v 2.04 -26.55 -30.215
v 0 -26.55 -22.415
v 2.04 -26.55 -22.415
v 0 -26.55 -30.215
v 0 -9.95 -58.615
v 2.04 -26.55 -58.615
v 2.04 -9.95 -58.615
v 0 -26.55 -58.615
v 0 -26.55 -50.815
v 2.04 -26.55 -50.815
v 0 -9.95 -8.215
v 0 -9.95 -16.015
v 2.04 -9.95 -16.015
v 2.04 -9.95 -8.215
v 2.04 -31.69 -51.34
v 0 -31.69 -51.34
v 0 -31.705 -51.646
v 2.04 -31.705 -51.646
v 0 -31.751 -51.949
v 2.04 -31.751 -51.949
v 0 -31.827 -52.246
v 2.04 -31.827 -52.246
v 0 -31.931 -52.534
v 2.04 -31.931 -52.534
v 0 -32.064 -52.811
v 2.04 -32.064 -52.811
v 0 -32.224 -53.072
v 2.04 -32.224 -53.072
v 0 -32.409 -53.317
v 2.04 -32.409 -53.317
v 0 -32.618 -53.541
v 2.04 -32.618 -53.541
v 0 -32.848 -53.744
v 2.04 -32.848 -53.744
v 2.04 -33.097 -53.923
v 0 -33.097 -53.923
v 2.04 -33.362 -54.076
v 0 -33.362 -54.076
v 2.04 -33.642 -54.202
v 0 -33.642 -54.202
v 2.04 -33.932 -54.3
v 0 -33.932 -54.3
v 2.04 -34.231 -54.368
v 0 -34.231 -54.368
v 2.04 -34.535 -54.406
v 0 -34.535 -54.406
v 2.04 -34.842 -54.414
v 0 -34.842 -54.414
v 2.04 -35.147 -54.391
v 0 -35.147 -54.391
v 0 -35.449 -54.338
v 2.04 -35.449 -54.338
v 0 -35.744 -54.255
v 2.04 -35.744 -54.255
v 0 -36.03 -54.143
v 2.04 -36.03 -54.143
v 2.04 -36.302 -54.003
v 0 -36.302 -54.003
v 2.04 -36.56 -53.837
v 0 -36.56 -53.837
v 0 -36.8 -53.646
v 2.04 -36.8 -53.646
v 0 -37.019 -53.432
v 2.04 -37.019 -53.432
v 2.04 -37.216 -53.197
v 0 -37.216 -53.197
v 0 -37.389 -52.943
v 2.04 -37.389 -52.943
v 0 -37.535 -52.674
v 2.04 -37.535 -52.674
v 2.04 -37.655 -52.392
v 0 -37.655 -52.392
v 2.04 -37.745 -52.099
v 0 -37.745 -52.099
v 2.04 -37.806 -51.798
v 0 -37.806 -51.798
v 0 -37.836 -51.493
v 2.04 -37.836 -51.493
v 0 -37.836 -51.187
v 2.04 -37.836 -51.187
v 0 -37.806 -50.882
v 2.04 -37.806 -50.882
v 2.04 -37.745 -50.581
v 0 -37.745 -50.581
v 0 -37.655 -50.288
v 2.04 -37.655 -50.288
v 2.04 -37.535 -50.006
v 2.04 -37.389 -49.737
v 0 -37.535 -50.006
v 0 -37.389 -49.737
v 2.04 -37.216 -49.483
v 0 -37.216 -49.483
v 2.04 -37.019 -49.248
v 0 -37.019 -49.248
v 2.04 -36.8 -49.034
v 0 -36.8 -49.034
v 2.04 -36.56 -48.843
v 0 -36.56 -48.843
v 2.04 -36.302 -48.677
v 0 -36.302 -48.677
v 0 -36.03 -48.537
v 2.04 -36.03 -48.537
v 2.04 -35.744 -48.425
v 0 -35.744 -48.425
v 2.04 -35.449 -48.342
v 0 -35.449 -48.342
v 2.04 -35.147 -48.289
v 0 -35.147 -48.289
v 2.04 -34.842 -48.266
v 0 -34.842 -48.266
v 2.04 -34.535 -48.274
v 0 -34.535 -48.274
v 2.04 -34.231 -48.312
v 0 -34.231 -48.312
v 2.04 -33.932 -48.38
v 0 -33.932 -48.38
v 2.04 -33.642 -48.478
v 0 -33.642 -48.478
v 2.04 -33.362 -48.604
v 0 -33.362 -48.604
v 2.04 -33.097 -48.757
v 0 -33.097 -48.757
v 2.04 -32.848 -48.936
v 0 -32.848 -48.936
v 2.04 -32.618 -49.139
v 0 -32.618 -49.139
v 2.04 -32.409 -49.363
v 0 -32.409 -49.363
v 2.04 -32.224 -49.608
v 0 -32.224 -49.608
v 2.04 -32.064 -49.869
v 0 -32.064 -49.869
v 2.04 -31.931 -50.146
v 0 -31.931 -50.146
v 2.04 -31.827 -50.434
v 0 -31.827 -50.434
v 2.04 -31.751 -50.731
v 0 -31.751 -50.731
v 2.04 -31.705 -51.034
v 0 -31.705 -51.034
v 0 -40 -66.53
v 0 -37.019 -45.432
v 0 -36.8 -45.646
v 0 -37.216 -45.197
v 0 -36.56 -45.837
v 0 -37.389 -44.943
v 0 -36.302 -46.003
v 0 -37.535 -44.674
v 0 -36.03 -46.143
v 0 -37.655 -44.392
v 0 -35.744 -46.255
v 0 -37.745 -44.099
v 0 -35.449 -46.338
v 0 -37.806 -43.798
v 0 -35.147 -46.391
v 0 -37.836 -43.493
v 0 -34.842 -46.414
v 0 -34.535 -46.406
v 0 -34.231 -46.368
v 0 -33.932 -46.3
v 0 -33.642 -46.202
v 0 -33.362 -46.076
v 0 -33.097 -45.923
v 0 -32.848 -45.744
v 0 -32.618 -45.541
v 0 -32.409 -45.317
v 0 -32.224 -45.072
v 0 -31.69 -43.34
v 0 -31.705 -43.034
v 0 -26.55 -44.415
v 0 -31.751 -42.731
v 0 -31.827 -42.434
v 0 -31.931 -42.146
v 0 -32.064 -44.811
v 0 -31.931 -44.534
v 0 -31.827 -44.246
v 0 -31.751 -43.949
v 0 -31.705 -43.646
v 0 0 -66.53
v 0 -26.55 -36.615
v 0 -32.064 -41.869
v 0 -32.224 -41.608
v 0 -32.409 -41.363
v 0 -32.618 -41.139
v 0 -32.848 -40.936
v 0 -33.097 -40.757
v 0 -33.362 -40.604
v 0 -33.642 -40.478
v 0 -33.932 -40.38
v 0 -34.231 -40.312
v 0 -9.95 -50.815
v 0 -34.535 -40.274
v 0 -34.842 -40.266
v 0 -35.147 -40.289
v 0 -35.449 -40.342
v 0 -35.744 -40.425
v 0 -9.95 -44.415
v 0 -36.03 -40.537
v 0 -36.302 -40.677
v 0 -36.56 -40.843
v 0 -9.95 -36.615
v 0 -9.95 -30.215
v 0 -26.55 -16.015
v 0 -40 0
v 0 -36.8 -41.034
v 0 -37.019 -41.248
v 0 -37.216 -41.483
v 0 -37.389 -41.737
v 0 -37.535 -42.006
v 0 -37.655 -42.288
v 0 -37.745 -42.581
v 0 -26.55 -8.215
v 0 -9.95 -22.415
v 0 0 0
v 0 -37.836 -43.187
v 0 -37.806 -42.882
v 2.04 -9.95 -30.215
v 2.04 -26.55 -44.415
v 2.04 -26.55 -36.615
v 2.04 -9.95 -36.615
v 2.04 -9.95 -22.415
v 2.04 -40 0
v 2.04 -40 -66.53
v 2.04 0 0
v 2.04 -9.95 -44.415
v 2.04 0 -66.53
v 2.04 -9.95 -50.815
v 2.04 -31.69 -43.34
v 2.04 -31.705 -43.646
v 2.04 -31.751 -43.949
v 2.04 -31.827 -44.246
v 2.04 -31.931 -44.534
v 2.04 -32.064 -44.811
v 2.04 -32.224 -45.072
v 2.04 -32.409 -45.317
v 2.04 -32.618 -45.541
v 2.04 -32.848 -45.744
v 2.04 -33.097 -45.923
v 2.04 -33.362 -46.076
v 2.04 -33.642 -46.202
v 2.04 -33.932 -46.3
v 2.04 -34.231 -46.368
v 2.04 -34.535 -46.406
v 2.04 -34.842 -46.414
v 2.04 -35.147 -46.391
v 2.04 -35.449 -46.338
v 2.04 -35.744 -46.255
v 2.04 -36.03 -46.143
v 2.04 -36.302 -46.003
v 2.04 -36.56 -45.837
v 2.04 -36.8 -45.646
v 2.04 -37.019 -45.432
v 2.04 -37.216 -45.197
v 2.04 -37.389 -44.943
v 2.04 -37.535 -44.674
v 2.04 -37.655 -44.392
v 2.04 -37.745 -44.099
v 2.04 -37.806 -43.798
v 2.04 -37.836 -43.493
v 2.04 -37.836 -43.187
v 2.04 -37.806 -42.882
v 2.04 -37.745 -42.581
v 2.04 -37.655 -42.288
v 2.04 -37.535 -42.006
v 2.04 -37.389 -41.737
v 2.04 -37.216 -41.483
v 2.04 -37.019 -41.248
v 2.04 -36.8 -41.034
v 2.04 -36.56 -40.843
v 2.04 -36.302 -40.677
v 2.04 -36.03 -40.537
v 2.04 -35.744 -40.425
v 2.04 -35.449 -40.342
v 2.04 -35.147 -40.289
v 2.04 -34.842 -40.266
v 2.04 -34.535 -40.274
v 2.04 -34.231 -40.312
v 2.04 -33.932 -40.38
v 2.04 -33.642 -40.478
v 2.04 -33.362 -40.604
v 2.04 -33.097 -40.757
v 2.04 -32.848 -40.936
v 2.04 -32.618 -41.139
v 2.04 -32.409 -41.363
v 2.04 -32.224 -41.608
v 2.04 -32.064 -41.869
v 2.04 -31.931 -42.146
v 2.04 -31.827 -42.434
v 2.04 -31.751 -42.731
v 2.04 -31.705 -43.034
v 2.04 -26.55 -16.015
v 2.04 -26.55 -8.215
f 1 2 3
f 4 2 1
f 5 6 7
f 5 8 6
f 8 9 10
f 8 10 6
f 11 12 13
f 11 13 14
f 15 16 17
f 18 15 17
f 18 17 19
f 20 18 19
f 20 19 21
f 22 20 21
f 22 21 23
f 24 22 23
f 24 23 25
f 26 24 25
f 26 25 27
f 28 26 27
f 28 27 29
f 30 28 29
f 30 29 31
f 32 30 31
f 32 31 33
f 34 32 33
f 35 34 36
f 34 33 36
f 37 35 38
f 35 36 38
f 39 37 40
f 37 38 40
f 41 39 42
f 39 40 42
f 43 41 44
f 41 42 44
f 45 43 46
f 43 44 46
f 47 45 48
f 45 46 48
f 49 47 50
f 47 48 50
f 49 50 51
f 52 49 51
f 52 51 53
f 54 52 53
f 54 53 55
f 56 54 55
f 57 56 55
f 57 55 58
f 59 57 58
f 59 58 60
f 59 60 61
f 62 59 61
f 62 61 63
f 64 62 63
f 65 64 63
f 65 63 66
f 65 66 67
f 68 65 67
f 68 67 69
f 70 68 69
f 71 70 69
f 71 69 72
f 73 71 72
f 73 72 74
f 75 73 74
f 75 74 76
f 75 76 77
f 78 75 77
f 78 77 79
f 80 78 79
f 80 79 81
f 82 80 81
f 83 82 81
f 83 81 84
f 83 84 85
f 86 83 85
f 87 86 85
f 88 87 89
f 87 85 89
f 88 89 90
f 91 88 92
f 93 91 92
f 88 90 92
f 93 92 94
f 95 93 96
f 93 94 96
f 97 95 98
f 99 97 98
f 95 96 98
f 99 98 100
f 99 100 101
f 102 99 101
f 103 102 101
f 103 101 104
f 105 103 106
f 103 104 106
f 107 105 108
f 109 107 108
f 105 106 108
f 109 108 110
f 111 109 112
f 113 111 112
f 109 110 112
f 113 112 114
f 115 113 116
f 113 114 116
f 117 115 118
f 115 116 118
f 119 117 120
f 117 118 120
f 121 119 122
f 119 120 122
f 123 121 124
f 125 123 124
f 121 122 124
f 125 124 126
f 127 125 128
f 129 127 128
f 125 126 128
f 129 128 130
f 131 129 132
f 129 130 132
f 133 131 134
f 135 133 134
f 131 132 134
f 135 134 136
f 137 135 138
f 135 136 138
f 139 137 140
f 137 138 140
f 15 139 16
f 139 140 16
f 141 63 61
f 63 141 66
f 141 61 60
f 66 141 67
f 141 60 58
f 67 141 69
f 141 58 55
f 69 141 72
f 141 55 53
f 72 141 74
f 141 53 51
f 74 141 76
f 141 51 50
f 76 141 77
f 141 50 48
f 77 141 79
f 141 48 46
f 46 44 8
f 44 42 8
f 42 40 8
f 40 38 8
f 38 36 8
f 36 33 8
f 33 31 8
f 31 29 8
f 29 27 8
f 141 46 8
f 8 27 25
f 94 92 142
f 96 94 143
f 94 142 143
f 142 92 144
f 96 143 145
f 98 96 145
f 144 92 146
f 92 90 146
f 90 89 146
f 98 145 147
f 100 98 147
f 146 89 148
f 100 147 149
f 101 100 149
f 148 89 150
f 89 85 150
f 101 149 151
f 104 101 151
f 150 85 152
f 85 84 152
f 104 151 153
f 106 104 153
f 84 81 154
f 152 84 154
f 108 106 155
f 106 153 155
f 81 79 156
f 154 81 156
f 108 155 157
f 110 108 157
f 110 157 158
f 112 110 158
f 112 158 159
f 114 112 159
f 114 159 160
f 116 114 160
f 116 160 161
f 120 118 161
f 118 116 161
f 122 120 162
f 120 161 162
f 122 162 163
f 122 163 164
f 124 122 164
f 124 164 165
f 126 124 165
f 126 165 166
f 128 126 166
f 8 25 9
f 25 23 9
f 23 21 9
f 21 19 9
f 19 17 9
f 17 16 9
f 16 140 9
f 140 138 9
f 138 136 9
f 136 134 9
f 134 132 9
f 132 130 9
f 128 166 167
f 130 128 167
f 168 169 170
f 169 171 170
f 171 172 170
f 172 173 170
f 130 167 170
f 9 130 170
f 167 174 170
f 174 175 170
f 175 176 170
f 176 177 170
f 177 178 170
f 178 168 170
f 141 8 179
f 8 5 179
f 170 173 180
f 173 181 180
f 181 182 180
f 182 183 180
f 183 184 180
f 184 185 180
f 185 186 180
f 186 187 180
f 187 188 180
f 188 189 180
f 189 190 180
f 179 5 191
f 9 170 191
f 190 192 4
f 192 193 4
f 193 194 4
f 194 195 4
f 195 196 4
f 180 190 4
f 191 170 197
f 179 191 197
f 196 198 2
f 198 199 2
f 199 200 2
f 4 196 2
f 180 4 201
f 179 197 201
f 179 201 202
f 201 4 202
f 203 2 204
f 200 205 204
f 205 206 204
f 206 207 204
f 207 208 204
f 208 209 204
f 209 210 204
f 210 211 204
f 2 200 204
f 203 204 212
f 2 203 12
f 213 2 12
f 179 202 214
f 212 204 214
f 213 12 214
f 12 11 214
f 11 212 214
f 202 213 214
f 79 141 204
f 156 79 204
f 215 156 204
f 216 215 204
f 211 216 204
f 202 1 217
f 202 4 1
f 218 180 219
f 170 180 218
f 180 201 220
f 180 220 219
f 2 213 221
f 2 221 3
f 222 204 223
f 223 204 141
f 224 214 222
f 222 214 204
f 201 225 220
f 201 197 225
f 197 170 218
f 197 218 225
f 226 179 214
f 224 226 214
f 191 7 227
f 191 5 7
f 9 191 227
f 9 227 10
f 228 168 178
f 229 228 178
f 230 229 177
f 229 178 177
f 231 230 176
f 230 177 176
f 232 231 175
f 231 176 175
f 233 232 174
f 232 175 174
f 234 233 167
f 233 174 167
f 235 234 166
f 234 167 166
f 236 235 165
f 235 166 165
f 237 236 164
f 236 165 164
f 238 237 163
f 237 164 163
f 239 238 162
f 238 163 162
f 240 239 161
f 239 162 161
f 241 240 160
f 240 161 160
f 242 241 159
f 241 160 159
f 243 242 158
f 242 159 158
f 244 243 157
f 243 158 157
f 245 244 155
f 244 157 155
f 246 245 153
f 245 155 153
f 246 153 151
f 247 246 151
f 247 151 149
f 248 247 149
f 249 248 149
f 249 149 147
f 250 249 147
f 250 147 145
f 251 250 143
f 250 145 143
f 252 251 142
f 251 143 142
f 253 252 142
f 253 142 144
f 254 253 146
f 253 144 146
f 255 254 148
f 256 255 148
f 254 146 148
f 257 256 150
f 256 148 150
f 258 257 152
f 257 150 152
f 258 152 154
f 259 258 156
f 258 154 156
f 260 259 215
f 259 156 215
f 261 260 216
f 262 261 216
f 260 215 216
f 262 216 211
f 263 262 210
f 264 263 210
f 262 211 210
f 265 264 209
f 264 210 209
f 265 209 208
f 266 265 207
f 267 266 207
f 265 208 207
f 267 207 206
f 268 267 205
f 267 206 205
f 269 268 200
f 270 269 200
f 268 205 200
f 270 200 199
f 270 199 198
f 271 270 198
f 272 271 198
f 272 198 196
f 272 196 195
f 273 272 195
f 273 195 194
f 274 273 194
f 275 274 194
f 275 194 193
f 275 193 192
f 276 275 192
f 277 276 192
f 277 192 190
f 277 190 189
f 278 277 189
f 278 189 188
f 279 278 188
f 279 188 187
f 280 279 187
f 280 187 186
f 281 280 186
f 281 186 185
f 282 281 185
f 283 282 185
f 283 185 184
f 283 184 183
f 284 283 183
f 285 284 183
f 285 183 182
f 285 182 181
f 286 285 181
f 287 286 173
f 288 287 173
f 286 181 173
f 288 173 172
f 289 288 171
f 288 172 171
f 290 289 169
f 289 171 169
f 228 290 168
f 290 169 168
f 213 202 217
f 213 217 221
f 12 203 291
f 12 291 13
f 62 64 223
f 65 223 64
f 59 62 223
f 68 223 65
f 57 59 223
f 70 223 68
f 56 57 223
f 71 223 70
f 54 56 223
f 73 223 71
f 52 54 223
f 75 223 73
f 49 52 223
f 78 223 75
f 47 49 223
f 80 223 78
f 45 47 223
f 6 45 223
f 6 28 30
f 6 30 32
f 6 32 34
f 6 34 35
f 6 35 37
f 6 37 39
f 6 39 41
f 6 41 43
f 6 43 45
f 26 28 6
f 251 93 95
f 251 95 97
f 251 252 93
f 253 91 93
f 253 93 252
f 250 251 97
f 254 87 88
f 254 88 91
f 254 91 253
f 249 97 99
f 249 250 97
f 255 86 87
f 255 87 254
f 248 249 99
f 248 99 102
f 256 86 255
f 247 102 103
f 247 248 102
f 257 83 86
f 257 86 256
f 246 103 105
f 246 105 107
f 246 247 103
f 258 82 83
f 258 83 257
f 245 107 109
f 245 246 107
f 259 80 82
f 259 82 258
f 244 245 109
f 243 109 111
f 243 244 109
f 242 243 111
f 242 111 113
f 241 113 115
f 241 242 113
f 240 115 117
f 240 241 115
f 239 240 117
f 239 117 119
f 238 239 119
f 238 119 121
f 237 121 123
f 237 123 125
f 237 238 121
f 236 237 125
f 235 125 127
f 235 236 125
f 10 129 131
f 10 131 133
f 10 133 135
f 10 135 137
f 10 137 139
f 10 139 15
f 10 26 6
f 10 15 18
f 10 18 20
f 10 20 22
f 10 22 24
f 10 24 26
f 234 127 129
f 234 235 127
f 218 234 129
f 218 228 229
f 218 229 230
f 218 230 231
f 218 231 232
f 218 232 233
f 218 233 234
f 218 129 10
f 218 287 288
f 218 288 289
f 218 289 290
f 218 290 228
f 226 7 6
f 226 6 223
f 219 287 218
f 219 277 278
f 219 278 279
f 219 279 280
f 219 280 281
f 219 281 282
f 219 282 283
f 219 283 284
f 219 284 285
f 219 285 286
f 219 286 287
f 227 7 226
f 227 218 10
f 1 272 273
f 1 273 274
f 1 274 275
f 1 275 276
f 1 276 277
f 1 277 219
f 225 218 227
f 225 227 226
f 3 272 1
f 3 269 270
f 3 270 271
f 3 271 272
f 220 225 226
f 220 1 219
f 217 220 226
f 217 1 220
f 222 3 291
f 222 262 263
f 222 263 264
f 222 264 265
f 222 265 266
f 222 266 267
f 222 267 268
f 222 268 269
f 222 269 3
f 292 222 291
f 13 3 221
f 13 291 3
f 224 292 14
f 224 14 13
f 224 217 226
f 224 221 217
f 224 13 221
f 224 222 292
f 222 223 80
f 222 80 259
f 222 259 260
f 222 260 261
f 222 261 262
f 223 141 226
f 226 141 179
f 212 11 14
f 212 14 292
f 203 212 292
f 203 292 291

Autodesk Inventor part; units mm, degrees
ref_plane "YZ Plane" through (0, 0, 0) normal (1, 0, 0) x (0, 1, 0)
ref_plane "XZ Plane" through (0, 0, 0) normal (0, 1, 0) x (-1, 0, 0)
ref_plane "XY Plane" through (0, 0, 0) normal (0, 0, 1) x (1, 0, 0)
sketch "Sketch1" plane through (0, 0, 0) normal (1, 0, 0) x (0, 1, 0)
  line L0 (0, 0) -> (-40, 0)
  line L1 (-40, 0) -> (-40, -66.53)
  line L2 (-40, -66.53) -> (0, -66.53)
  line L3 (0, -66.53) -> (0, 0)
  point P0 (-20, -33.265)
  dimension "d0" = 40
  dimension "d1" = 66.53
  dimension "d13" = 33.265
  dimension "d14" = 20
extrude "Extrusion1" add sketch "Sketch1" along normal blind 2.04
sketch "Sketch2" plane through (0, 0, 0) normal (1, 0, 0) x (0, 1, 0)
  line L0 (-26.55, -58.615) -> (-9.95, -58.615)
  line L1 (-9.95, -58.615) -> (-9.95, -50.815)
  line L2 (-9.95, -50.815) -> (-26.55, -50.815)
  line L3 (-26.55, -50.815) -> (-26.55, -58.615)
  line L4 (0, -66.53) -> (0, 0) projected
  line L5 (-40, -66.53) -> (0, -66.53) projected
  dimension "d4" = 16.6
  dimension "d5" = 7.8
  dimension "d11" = 9.95
  dimension "d12" = 7.915
extrude "Extrusion2" cut sketch "Sketch2" along normal mid plane 254
pattern_linear "Rectangular Pattern1" count 4 spacing 14.2 along (0, 0, 1) of "Extrusion2"
sketch "Sketch3" plane through (0, 0, 0) normal (1, 0, 0) x (0, 1, 0)
  circle A0 centre (-34.765, -51.34) radius 3.075
  line L0 (-40, -66.53) -> (0, -66.53) projected
  line L1 (-40, 0) -> (-40, -66.53) projected
  point P0 (0, 0)
  dimension "d15" = 6.15
  dimension "d16" = 15.19
  dimension "d17" = 5.235
extrude "Extrusion3" cut sketch "Sketch3" along normal up to next
pattern_linear "Rectangular Pattern2" count 2 spacing 8 along (0, 0, 1) of "Extrusion3"
sketch "Sketch4" plane through (0, 0, 0) normal (-1, 0, 0) x (0, 0, 1)
  circle A0 centre (-43.34, -34.765) radius 3.075 projected
  circle A1 centre (-51.34, -34.765) radius 3.075 projected
  line L0 (-8.215, -26.55) -> (-16.015, -26.55) projected
  line L1 (-16.015, -26.55) -> (-16.015, -9.95) projected
  line L2 (-16.015, -9.95) -> (-8.215, -9.95) projected
  line L3 (-8.215, -9.95) -> (-8.215, -26.55) projected
  line L4 (-22.415, -26.55) -> (-30.215, -26.55) projected
  line L5 (-30.215, -26.55) -> (-30.215, -9.95) projected
  line L6 (-30.215, -9.95) -> (-22.415, -9.95) projected
  line L7 (-22.415, -9.95) -> (-22.415, -26.55) projected
  line L8 (-36.615, -26.55) -> (-44.415, -26.55) projected
  line L9 (-44.415, -26.55) -> (-44.415, -9.95) projected
  line L10 (-44.415, -9.95) -> (-36.615, -9.95) projected
  line L11 (-36.615, -9.95) -> (-36.615, -26.55) projected
  line L12 (-50.815, -26.55) -> (-58.615, -26.55) projected
  line L13 (-58.615, -26.55) -> (-58.615, -9.95) projected
  line L14 (-58.615, -9.95) -> (-50.815, -9.95) projected
  line L15 (-50.815, -9.95) -> (-50.815, -26.55) projected
  line L16 (0, 0) -> (0, -40) projected
  line L17 (-66.53, 0) -> (0, 0) projected
  line L18 (-66.53, -40) -> (-66.53, 0) projected
  line L19 (0, -40) -> (-66.53, -40) projected
  circle A2 centre (-54.715, -13.85) radius 3.9
  circle A3 centre (-54.715, -22.65) radius 3.9
  circle A4 centre (-40.515, -13.85) radius 3.9
  circle A5 centre (-40.515, -22.65) radius 3.9
  circle A6 centre (-26.315, -13.85) radius 3.9
  circle A7 centre (-26.315, -22.65) radius 3.9
  circle A8 centre (-12.115, -13.85) radius 3.9
  circle A9 centre (-12.115, -22.65) radius 3.9
equation "\"d13\" = 0.5 * d1"
equation "\"d14\" = 0.5 * d0"
properties part number "temp_sensor_front_plate"
